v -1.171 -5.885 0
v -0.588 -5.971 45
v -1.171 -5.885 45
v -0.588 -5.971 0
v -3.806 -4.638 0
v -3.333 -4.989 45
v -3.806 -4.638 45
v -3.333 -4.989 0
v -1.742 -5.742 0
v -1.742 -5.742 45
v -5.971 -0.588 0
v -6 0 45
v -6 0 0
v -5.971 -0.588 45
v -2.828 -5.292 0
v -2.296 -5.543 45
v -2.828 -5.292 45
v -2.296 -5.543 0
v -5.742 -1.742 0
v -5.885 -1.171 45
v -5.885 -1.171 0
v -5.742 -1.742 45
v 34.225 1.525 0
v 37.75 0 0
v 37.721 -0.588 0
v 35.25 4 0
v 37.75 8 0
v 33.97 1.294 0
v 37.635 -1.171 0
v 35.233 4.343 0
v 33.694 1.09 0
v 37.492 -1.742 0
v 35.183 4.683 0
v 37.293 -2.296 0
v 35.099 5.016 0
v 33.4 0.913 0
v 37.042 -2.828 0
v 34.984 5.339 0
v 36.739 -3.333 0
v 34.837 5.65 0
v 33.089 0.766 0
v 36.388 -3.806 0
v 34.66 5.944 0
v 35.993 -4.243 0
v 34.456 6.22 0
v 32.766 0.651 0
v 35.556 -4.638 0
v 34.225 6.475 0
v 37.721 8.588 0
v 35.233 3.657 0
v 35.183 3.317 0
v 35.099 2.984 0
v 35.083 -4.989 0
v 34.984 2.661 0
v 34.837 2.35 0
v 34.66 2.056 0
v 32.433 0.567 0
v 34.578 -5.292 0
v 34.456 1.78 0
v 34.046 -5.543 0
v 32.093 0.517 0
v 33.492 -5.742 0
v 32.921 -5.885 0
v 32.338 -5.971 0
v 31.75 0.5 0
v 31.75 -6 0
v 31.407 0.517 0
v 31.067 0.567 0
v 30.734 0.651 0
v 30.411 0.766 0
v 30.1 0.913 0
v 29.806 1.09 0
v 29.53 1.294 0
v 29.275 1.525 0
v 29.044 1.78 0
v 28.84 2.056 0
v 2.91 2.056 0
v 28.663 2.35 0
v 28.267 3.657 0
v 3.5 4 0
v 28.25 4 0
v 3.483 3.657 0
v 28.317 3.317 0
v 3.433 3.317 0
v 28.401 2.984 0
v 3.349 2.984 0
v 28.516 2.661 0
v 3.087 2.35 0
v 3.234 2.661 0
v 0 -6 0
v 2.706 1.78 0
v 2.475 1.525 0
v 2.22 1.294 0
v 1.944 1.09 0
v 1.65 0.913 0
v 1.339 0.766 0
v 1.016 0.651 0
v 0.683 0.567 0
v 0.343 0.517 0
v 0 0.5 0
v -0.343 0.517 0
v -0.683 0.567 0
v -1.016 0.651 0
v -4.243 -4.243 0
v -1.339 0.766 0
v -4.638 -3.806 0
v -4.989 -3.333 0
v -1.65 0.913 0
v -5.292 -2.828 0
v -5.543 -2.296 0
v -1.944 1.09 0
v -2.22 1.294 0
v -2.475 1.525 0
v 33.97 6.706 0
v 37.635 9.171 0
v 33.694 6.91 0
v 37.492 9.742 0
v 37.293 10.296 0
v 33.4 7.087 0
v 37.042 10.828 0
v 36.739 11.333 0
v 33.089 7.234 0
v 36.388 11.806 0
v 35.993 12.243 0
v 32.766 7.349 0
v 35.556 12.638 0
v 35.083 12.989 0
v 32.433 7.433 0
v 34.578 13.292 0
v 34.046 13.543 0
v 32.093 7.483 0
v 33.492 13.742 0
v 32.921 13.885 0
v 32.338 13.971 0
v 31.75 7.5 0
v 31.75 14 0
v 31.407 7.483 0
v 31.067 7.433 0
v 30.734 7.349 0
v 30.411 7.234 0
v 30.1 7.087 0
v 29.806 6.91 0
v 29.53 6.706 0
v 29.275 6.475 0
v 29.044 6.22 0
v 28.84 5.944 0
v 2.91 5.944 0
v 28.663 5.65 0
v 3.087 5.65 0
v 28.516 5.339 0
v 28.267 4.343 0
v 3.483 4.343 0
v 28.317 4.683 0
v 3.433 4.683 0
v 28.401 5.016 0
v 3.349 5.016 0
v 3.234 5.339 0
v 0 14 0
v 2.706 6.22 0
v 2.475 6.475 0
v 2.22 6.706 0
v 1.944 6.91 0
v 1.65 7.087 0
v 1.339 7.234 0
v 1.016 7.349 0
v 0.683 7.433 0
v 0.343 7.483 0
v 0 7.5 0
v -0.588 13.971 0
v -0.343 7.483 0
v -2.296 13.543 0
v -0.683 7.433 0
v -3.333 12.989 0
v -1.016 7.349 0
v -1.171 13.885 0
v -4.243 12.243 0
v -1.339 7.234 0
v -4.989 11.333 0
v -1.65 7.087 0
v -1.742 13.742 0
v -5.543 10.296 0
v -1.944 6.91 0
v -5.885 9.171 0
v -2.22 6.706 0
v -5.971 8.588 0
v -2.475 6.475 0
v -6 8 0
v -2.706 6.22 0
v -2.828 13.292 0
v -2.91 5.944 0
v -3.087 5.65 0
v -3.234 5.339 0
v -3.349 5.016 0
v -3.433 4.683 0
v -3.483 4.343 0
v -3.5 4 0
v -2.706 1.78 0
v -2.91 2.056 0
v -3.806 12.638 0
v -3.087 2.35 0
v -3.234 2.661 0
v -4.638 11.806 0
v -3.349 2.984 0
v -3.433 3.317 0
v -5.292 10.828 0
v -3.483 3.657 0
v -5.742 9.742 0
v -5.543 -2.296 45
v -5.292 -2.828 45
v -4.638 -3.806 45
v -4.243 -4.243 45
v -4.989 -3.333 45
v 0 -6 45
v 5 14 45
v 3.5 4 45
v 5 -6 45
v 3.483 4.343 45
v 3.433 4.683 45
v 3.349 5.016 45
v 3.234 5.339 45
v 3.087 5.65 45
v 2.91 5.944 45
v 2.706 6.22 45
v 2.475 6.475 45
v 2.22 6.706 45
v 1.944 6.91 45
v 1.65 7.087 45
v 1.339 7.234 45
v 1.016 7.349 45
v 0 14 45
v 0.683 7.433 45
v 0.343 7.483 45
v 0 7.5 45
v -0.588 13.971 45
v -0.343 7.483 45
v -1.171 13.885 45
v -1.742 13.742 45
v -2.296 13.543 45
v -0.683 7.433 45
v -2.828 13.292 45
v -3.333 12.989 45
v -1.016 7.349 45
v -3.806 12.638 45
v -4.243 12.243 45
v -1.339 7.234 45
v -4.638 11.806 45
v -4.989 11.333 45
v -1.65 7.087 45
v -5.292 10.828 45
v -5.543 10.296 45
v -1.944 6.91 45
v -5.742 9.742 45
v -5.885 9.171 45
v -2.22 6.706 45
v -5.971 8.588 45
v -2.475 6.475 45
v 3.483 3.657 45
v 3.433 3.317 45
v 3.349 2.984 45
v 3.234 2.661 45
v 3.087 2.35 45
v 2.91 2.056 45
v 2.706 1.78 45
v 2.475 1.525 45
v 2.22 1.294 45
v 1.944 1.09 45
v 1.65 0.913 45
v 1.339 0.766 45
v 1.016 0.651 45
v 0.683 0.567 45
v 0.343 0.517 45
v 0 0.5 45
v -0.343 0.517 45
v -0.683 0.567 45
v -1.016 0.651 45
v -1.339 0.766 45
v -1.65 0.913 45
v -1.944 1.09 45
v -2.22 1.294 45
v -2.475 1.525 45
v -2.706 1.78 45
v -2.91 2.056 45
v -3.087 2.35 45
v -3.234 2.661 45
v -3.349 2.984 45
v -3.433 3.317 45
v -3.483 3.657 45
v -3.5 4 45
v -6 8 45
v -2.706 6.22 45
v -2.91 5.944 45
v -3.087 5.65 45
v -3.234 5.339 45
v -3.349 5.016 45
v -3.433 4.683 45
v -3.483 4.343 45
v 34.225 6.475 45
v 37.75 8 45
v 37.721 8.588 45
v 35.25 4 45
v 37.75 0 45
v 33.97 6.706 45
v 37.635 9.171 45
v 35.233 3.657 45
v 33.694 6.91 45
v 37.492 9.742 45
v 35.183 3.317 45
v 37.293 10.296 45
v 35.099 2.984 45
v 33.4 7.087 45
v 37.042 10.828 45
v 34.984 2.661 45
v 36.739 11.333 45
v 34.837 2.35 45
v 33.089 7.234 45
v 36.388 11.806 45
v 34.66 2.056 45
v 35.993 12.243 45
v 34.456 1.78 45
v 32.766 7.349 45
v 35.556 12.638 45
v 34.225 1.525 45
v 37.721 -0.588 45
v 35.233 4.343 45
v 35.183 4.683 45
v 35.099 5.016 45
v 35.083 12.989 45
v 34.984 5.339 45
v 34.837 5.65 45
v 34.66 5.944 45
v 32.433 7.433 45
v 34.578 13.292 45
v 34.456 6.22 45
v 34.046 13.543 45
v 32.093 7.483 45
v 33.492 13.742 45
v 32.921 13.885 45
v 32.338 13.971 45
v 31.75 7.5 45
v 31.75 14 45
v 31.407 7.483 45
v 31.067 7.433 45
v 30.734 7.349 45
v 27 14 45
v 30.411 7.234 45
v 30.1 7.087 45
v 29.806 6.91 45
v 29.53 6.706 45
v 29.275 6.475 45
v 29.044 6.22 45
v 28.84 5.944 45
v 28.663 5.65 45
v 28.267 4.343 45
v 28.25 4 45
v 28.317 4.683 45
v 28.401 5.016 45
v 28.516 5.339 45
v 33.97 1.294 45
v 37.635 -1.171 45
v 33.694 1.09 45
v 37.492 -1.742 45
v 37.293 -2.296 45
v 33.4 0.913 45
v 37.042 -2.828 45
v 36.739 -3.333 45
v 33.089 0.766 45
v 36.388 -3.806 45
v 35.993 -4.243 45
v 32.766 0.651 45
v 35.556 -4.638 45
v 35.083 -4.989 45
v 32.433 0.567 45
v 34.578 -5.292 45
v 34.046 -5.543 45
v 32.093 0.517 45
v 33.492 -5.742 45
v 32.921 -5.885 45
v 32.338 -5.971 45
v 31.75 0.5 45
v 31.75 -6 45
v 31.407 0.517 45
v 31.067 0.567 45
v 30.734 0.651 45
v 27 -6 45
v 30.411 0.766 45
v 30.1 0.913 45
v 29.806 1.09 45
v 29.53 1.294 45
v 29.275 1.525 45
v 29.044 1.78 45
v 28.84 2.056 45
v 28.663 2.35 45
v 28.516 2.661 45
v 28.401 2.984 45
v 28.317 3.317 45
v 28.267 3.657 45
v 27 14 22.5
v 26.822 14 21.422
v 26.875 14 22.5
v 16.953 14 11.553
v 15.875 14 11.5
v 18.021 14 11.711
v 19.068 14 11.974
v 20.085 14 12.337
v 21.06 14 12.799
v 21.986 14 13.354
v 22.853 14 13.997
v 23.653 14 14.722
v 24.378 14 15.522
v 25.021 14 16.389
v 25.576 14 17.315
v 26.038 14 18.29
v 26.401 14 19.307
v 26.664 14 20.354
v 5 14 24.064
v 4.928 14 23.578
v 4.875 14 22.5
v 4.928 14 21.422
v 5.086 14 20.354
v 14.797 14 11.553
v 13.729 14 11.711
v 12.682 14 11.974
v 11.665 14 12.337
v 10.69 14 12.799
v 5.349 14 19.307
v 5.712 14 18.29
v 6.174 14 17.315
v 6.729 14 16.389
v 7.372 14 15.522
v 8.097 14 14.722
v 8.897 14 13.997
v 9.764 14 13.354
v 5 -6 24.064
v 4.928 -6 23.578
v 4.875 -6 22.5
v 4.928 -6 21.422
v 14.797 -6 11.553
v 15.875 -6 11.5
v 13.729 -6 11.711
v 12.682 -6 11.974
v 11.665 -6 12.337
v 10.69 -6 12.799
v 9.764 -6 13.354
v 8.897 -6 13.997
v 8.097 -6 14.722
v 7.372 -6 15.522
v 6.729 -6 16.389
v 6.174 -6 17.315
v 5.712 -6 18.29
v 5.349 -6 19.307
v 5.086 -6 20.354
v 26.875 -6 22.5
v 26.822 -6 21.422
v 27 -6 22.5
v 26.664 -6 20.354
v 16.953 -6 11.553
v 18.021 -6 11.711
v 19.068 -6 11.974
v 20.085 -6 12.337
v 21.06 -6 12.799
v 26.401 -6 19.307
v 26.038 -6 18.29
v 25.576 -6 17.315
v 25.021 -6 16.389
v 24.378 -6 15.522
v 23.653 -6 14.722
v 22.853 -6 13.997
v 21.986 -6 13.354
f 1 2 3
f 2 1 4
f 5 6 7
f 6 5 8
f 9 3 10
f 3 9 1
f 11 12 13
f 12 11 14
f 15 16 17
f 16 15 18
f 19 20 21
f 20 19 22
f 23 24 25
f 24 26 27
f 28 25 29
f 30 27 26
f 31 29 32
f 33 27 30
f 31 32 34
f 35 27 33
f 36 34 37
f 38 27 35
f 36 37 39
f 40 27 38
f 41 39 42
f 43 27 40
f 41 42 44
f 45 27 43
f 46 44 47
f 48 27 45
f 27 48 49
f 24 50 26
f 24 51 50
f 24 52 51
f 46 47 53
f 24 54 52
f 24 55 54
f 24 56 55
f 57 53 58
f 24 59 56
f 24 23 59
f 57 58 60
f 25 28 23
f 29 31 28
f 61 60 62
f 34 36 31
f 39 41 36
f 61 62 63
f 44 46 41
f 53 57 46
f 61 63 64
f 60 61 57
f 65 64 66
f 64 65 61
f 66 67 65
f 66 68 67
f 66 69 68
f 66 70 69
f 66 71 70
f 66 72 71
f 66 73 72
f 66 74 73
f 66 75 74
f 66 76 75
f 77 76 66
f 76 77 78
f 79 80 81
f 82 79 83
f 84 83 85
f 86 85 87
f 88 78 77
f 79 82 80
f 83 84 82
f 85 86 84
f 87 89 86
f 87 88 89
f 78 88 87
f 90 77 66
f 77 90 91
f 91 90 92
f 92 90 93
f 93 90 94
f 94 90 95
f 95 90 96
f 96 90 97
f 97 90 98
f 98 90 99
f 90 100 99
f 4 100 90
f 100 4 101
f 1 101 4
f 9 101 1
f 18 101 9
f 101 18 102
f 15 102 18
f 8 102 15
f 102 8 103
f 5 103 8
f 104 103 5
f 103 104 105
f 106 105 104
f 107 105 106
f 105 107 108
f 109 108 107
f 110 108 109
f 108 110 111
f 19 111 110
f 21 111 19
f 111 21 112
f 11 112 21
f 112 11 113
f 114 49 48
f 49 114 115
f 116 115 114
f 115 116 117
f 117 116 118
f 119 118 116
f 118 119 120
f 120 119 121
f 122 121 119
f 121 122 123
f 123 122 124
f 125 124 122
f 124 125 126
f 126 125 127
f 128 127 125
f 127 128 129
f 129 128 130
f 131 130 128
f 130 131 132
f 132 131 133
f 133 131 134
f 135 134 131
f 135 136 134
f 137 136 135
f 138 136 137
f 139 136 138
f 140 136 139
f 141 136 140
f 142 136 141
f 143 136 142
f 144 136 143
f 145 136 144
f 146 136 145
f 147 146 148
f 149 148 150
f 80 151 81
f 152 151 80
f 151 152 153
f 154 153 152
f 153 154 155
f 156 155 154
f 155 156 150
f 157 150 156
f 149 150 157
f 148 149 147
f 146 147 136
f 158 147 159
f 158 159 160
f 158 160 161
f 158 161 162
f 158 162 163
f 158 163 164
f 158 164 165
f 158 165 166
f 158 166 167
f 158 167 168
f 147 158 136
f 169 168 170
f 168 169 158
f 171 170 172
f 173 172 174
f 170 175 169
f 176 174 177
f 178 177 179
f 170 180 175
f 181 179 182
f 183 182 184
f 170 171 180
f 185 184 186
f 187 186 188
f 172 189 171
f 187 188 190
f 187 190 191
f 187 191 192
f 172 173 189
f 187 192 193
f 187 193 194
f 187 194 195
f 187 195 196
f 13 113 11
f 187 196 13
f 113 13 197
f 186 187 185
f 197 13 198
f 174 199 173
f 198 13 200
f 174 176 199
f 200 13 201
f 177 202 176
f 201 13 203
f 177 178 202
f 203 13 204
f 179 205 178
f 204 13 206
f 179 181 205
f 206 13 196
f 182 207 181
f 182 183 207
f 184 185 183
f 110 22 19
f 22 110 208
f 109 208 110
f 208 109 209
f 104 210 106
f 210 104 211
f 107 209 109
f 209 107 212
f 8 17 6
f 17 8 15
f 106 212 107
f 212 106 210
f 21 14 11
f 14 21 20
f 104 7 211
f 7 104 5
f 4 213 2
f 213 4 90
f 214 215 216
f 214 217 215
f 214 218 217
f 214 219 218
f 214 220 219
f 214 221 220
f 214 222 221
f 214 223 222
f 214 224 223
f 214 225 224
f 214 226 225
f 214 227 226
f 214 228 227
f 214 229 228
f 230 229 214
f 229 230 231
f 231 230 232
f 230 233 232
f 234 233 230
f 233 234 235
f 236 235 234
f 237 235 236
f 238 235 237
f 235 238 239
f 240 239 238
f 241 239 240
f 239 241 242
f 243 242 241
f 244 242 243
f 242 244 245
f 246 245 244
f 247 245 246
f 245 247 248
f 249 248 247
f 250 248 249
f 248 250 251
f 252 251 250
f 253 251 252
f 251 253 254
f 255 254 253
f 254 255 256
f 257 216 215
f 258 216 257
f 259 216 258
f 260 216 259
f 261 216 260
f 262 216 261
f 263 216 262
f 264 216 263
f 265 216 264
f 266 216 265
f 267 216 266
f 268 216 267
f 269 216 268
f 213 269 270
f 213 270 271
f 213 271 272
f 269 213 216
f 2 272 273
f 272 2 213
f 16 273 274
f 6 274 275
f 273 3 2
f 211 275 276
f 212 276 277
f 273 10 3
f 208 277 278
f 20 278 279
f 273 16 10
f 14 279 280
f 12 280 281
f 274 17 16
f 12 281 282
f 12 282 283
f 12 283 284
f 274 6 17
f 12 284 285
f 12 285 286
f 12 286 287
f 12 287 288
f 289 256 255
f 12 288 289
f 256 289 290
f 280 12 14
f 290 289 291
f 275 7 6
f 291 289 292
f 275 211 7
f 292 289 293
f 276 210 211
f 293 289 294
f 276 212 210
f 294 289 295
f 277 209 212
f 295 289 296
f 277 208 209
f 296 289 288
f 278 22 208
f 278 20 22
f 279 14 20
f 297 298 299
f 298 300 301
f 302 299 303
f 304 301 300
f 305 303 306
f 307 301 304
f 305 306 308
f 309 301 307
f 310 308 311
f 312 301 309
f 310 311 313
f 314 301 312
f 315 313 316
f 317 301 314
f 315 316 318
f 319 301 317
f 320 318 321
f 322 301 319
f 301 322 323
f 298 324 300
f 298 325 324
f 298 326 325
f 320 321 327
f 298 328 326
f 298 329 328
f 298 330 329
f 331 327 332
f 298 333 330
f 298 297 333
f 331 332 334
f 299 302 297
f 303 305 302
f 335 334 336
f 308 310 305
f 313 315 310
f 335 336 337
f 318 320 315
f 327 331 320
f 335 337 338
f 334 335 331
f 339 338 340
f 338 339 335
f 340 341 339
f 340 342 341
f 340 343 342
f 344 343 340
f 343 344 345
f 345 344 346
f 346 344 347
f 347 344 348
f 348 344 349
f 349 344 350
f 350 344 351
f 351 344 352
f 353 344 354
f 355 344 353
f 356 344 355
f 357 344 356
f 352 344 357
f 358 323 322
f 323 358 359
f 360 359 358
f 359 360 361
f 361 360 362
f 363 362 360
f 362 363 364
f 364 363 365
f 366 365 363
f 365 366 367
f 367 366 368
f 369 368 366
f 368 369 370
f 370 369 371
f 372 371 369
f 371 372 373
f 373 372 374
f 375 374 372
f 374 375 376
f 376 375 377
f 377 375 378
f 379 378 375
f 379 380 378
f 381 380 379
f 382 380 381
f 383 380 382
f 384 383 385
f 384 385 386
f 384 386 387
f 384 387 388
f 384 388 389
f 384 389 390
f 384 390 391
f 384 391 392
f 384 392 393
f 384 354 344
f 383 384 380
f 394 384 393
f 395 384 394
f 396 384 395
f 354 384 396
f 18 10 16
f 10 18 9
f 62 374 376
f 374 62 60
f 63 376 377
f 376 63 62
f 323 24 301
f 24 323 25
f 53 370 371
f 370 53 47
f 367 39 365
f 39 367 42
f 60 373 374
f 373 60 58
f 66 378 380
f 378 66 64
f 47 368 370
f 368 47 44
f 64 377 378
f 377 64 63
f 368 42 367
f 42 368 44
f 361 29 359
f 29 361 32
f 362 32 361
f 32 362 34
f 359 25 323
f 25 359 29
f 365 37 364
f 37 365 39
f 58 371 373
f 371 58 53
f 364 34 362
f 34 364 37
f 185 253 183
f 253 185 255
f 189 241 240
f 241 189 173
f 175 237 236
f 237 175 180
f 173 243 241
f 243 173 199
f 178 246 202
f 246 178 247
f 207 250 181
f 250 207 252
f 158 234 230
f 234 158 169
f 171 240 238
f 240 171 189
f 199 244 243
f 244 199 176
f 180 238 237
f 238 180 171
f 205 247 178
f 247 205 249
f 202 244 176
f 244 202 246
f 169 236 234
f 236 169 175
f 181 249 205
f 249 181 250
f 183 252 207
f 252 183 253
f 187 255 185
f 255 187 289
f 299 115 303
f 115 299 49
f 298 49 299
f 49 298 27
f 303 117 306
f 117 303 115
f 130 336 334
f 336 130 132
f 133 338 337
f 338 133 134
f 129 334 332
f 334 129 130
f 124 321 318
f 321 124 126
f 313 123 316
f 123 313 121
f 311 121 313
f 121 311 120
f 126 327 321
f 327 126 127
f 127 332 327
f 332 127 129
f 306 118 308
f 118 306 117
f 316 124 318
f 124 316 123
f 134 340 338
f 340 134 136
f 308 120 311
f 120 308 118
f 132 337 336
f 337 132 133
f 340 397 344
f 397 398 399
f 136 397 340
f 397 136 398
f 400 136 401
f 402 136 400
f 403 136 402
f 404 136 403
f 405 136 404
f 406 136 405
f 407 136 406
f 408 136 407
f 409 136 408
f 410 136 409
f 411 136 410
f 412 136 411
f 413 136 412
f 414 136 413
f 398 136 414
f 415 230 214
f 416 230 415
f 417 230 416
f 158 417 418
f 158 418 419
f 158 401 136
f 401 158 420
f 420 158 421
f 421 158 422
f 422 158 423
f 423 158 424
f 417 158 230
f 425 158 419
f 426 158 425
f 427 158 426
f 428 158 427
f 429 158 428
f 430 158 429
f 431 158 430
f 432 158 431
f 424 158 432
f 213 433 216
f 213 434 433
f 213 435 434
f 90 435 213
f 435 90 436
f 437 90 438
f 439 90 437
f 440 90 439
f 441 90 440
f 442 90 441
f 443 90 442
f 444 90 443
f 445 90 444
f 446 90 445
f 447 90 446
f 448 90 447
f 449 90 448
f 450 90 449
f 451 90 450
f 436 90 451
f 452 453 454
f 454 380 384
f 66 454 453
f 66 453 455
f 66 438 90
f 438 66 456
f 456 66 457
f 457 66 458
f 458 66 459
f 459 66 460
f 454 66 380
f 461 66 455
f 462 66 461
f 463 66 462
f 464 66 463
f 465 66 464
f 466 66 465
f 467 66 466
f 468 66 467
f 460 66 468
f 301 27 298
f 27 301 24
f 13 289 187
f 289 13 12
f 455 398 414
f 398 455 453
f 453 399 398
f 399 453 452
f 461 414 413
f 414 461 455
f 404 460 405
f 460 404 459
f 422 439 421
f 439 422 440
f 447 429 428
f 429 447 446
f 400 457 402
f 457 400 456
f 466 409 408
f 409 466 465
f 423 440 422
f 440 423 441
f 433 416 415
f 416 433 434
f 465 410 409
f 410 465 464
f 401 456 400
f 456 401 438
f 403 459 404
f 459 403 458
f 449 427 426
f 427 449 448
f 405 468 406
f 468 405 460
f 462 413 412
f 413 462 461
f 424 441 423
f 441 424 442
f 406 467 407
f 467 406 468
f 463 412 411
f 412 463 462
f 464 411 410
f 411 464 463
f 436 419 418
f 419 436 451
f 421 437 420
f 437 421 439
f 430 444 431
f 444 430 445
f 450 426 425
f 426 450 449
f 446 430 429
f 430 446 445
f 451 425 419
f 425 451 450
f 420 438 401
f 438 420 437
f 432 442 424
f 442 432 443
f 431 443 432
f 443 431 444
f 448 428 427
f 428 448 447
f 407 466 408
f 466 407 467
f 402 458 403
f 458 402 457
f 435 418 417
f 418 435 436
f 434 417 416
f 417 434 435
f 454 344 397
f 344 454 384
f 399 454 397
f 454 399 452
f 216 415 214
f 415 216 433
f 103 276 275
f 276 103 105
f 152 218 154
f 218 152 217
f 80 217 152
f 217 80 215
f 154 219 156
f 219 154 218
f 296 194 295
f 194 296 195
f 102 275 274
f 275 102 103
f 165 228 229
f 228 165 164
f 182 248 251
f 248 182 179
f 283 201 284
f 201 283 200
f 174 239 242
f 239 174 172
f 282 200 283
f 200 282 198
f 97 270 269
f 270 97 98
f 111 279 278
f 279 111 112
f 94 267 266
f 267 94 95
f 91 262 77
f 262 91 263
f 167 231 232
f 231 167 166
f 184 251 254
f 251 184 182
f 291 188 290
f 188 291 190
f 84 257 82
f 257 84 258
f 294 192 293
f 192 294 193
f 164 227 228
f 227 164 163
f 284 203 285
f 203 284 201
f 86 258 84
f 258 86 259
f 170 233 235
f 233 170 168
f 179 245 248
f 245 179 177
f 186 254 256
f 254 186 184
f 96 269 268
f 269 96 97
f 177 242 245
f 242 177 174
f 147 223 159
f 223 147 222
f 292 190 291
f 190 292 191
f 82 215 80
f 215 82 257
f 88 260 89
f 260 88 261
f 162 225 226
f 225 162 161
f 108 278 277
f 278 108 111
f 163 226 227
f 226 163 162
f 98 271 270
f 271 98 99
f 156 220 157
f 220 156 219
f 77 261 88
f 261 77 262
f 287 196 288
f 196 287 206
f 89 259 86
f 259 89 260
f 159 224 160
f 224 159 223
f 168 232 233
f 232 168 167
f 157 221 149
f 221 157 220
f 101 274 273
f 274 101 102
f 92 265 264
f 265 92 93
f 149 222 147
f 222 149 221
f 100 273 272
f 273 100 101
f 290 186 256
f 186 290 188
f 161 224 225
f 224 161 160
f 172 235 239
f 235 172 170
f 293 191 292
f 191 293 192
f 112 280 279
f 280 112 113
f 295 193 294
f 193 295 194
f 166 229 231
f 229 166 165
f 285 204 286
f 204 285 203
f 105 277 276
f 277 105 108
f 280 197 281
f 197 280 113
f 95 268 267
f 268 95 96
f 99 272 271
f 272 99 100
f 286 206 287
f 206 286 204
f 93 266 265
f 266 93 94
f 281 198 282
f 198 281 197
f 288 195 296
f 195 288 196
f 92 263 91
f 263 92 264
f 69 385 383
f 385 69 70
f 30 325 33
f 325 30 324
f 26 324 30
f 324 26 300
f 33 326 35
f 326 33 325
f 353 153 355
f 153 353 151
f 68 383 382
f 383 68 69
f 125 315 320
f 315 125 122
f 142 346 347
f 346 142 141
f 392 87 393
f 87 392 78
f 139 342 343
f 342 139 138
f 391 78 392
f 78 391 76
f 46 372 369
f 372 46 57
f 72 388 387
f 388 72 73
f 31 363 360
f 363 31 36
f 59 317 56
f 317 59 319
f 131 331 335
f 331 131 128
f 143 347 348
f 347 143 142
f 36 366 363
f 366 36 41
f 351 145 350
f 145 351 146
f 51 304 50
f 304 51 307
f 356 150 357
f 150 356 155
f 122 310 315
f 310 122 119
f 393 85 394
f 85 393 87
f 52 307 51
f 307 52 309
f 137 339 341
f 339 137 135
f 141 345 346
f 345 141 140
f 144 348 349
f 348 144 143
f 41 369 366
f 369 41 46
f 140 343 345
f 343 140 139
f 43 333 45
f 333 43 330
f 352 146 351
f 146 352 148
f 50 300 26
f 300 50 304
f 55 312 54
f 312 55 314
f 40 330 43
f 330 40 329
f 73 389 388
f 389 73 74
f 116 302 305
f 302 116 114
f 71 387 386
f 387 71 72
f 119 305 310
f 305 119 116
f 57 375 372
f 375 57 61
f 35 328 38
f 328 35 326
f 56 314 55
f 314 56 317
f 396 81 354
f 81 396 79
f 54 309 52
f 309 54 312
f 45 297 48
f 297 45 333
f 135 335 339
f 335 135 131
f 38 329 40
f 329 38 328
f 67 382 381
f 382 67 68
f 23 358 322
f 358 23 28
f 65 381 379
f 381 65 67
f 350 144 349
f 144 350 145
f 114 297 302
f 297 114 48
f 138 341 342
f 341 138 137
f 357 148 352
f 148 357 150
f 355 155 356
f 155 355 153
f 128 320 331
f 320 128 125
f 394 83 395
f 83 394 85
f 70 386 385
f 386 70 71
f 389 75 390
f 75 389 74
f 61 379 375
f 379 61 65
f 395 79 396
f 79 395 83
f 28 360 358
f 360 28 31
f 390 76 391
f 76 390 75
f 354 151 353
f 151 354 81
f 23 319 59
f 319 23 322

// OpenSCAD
$fn=64;
difference() {
    union() {
        translate([0, 0, 0]) cylinder(h = 45, r = 6);
        translate([31.75, 0, 0]) cylinder(h = 45, r = 6);
        translate([0, 8, 0]) cylinder(h = 45, r = 6);
        translate([31.75, 8, 0]) cylinder(h = 45, r = 6);
        translate([0, -6, 0]) cube([31.75, 20, 45]);;
        translate([-6, 0, 0]) cube([43.75, 8, 45]);;
    }
    translate([31.75 / 2.0, -8.0, 45.0 / 2.0]) rotate([270,0,0]) cylinder(h = 24, r = 11);
    translate([5, -8.0, 45.0 / 2.0]) cube([22,24,25]); 
    
    translate([0, 4, -1]) cylinder(h = 47, r = 3.5);
    translate([31.75, 4, -1]) cylinder(h = 47, r = 3.5);
}
